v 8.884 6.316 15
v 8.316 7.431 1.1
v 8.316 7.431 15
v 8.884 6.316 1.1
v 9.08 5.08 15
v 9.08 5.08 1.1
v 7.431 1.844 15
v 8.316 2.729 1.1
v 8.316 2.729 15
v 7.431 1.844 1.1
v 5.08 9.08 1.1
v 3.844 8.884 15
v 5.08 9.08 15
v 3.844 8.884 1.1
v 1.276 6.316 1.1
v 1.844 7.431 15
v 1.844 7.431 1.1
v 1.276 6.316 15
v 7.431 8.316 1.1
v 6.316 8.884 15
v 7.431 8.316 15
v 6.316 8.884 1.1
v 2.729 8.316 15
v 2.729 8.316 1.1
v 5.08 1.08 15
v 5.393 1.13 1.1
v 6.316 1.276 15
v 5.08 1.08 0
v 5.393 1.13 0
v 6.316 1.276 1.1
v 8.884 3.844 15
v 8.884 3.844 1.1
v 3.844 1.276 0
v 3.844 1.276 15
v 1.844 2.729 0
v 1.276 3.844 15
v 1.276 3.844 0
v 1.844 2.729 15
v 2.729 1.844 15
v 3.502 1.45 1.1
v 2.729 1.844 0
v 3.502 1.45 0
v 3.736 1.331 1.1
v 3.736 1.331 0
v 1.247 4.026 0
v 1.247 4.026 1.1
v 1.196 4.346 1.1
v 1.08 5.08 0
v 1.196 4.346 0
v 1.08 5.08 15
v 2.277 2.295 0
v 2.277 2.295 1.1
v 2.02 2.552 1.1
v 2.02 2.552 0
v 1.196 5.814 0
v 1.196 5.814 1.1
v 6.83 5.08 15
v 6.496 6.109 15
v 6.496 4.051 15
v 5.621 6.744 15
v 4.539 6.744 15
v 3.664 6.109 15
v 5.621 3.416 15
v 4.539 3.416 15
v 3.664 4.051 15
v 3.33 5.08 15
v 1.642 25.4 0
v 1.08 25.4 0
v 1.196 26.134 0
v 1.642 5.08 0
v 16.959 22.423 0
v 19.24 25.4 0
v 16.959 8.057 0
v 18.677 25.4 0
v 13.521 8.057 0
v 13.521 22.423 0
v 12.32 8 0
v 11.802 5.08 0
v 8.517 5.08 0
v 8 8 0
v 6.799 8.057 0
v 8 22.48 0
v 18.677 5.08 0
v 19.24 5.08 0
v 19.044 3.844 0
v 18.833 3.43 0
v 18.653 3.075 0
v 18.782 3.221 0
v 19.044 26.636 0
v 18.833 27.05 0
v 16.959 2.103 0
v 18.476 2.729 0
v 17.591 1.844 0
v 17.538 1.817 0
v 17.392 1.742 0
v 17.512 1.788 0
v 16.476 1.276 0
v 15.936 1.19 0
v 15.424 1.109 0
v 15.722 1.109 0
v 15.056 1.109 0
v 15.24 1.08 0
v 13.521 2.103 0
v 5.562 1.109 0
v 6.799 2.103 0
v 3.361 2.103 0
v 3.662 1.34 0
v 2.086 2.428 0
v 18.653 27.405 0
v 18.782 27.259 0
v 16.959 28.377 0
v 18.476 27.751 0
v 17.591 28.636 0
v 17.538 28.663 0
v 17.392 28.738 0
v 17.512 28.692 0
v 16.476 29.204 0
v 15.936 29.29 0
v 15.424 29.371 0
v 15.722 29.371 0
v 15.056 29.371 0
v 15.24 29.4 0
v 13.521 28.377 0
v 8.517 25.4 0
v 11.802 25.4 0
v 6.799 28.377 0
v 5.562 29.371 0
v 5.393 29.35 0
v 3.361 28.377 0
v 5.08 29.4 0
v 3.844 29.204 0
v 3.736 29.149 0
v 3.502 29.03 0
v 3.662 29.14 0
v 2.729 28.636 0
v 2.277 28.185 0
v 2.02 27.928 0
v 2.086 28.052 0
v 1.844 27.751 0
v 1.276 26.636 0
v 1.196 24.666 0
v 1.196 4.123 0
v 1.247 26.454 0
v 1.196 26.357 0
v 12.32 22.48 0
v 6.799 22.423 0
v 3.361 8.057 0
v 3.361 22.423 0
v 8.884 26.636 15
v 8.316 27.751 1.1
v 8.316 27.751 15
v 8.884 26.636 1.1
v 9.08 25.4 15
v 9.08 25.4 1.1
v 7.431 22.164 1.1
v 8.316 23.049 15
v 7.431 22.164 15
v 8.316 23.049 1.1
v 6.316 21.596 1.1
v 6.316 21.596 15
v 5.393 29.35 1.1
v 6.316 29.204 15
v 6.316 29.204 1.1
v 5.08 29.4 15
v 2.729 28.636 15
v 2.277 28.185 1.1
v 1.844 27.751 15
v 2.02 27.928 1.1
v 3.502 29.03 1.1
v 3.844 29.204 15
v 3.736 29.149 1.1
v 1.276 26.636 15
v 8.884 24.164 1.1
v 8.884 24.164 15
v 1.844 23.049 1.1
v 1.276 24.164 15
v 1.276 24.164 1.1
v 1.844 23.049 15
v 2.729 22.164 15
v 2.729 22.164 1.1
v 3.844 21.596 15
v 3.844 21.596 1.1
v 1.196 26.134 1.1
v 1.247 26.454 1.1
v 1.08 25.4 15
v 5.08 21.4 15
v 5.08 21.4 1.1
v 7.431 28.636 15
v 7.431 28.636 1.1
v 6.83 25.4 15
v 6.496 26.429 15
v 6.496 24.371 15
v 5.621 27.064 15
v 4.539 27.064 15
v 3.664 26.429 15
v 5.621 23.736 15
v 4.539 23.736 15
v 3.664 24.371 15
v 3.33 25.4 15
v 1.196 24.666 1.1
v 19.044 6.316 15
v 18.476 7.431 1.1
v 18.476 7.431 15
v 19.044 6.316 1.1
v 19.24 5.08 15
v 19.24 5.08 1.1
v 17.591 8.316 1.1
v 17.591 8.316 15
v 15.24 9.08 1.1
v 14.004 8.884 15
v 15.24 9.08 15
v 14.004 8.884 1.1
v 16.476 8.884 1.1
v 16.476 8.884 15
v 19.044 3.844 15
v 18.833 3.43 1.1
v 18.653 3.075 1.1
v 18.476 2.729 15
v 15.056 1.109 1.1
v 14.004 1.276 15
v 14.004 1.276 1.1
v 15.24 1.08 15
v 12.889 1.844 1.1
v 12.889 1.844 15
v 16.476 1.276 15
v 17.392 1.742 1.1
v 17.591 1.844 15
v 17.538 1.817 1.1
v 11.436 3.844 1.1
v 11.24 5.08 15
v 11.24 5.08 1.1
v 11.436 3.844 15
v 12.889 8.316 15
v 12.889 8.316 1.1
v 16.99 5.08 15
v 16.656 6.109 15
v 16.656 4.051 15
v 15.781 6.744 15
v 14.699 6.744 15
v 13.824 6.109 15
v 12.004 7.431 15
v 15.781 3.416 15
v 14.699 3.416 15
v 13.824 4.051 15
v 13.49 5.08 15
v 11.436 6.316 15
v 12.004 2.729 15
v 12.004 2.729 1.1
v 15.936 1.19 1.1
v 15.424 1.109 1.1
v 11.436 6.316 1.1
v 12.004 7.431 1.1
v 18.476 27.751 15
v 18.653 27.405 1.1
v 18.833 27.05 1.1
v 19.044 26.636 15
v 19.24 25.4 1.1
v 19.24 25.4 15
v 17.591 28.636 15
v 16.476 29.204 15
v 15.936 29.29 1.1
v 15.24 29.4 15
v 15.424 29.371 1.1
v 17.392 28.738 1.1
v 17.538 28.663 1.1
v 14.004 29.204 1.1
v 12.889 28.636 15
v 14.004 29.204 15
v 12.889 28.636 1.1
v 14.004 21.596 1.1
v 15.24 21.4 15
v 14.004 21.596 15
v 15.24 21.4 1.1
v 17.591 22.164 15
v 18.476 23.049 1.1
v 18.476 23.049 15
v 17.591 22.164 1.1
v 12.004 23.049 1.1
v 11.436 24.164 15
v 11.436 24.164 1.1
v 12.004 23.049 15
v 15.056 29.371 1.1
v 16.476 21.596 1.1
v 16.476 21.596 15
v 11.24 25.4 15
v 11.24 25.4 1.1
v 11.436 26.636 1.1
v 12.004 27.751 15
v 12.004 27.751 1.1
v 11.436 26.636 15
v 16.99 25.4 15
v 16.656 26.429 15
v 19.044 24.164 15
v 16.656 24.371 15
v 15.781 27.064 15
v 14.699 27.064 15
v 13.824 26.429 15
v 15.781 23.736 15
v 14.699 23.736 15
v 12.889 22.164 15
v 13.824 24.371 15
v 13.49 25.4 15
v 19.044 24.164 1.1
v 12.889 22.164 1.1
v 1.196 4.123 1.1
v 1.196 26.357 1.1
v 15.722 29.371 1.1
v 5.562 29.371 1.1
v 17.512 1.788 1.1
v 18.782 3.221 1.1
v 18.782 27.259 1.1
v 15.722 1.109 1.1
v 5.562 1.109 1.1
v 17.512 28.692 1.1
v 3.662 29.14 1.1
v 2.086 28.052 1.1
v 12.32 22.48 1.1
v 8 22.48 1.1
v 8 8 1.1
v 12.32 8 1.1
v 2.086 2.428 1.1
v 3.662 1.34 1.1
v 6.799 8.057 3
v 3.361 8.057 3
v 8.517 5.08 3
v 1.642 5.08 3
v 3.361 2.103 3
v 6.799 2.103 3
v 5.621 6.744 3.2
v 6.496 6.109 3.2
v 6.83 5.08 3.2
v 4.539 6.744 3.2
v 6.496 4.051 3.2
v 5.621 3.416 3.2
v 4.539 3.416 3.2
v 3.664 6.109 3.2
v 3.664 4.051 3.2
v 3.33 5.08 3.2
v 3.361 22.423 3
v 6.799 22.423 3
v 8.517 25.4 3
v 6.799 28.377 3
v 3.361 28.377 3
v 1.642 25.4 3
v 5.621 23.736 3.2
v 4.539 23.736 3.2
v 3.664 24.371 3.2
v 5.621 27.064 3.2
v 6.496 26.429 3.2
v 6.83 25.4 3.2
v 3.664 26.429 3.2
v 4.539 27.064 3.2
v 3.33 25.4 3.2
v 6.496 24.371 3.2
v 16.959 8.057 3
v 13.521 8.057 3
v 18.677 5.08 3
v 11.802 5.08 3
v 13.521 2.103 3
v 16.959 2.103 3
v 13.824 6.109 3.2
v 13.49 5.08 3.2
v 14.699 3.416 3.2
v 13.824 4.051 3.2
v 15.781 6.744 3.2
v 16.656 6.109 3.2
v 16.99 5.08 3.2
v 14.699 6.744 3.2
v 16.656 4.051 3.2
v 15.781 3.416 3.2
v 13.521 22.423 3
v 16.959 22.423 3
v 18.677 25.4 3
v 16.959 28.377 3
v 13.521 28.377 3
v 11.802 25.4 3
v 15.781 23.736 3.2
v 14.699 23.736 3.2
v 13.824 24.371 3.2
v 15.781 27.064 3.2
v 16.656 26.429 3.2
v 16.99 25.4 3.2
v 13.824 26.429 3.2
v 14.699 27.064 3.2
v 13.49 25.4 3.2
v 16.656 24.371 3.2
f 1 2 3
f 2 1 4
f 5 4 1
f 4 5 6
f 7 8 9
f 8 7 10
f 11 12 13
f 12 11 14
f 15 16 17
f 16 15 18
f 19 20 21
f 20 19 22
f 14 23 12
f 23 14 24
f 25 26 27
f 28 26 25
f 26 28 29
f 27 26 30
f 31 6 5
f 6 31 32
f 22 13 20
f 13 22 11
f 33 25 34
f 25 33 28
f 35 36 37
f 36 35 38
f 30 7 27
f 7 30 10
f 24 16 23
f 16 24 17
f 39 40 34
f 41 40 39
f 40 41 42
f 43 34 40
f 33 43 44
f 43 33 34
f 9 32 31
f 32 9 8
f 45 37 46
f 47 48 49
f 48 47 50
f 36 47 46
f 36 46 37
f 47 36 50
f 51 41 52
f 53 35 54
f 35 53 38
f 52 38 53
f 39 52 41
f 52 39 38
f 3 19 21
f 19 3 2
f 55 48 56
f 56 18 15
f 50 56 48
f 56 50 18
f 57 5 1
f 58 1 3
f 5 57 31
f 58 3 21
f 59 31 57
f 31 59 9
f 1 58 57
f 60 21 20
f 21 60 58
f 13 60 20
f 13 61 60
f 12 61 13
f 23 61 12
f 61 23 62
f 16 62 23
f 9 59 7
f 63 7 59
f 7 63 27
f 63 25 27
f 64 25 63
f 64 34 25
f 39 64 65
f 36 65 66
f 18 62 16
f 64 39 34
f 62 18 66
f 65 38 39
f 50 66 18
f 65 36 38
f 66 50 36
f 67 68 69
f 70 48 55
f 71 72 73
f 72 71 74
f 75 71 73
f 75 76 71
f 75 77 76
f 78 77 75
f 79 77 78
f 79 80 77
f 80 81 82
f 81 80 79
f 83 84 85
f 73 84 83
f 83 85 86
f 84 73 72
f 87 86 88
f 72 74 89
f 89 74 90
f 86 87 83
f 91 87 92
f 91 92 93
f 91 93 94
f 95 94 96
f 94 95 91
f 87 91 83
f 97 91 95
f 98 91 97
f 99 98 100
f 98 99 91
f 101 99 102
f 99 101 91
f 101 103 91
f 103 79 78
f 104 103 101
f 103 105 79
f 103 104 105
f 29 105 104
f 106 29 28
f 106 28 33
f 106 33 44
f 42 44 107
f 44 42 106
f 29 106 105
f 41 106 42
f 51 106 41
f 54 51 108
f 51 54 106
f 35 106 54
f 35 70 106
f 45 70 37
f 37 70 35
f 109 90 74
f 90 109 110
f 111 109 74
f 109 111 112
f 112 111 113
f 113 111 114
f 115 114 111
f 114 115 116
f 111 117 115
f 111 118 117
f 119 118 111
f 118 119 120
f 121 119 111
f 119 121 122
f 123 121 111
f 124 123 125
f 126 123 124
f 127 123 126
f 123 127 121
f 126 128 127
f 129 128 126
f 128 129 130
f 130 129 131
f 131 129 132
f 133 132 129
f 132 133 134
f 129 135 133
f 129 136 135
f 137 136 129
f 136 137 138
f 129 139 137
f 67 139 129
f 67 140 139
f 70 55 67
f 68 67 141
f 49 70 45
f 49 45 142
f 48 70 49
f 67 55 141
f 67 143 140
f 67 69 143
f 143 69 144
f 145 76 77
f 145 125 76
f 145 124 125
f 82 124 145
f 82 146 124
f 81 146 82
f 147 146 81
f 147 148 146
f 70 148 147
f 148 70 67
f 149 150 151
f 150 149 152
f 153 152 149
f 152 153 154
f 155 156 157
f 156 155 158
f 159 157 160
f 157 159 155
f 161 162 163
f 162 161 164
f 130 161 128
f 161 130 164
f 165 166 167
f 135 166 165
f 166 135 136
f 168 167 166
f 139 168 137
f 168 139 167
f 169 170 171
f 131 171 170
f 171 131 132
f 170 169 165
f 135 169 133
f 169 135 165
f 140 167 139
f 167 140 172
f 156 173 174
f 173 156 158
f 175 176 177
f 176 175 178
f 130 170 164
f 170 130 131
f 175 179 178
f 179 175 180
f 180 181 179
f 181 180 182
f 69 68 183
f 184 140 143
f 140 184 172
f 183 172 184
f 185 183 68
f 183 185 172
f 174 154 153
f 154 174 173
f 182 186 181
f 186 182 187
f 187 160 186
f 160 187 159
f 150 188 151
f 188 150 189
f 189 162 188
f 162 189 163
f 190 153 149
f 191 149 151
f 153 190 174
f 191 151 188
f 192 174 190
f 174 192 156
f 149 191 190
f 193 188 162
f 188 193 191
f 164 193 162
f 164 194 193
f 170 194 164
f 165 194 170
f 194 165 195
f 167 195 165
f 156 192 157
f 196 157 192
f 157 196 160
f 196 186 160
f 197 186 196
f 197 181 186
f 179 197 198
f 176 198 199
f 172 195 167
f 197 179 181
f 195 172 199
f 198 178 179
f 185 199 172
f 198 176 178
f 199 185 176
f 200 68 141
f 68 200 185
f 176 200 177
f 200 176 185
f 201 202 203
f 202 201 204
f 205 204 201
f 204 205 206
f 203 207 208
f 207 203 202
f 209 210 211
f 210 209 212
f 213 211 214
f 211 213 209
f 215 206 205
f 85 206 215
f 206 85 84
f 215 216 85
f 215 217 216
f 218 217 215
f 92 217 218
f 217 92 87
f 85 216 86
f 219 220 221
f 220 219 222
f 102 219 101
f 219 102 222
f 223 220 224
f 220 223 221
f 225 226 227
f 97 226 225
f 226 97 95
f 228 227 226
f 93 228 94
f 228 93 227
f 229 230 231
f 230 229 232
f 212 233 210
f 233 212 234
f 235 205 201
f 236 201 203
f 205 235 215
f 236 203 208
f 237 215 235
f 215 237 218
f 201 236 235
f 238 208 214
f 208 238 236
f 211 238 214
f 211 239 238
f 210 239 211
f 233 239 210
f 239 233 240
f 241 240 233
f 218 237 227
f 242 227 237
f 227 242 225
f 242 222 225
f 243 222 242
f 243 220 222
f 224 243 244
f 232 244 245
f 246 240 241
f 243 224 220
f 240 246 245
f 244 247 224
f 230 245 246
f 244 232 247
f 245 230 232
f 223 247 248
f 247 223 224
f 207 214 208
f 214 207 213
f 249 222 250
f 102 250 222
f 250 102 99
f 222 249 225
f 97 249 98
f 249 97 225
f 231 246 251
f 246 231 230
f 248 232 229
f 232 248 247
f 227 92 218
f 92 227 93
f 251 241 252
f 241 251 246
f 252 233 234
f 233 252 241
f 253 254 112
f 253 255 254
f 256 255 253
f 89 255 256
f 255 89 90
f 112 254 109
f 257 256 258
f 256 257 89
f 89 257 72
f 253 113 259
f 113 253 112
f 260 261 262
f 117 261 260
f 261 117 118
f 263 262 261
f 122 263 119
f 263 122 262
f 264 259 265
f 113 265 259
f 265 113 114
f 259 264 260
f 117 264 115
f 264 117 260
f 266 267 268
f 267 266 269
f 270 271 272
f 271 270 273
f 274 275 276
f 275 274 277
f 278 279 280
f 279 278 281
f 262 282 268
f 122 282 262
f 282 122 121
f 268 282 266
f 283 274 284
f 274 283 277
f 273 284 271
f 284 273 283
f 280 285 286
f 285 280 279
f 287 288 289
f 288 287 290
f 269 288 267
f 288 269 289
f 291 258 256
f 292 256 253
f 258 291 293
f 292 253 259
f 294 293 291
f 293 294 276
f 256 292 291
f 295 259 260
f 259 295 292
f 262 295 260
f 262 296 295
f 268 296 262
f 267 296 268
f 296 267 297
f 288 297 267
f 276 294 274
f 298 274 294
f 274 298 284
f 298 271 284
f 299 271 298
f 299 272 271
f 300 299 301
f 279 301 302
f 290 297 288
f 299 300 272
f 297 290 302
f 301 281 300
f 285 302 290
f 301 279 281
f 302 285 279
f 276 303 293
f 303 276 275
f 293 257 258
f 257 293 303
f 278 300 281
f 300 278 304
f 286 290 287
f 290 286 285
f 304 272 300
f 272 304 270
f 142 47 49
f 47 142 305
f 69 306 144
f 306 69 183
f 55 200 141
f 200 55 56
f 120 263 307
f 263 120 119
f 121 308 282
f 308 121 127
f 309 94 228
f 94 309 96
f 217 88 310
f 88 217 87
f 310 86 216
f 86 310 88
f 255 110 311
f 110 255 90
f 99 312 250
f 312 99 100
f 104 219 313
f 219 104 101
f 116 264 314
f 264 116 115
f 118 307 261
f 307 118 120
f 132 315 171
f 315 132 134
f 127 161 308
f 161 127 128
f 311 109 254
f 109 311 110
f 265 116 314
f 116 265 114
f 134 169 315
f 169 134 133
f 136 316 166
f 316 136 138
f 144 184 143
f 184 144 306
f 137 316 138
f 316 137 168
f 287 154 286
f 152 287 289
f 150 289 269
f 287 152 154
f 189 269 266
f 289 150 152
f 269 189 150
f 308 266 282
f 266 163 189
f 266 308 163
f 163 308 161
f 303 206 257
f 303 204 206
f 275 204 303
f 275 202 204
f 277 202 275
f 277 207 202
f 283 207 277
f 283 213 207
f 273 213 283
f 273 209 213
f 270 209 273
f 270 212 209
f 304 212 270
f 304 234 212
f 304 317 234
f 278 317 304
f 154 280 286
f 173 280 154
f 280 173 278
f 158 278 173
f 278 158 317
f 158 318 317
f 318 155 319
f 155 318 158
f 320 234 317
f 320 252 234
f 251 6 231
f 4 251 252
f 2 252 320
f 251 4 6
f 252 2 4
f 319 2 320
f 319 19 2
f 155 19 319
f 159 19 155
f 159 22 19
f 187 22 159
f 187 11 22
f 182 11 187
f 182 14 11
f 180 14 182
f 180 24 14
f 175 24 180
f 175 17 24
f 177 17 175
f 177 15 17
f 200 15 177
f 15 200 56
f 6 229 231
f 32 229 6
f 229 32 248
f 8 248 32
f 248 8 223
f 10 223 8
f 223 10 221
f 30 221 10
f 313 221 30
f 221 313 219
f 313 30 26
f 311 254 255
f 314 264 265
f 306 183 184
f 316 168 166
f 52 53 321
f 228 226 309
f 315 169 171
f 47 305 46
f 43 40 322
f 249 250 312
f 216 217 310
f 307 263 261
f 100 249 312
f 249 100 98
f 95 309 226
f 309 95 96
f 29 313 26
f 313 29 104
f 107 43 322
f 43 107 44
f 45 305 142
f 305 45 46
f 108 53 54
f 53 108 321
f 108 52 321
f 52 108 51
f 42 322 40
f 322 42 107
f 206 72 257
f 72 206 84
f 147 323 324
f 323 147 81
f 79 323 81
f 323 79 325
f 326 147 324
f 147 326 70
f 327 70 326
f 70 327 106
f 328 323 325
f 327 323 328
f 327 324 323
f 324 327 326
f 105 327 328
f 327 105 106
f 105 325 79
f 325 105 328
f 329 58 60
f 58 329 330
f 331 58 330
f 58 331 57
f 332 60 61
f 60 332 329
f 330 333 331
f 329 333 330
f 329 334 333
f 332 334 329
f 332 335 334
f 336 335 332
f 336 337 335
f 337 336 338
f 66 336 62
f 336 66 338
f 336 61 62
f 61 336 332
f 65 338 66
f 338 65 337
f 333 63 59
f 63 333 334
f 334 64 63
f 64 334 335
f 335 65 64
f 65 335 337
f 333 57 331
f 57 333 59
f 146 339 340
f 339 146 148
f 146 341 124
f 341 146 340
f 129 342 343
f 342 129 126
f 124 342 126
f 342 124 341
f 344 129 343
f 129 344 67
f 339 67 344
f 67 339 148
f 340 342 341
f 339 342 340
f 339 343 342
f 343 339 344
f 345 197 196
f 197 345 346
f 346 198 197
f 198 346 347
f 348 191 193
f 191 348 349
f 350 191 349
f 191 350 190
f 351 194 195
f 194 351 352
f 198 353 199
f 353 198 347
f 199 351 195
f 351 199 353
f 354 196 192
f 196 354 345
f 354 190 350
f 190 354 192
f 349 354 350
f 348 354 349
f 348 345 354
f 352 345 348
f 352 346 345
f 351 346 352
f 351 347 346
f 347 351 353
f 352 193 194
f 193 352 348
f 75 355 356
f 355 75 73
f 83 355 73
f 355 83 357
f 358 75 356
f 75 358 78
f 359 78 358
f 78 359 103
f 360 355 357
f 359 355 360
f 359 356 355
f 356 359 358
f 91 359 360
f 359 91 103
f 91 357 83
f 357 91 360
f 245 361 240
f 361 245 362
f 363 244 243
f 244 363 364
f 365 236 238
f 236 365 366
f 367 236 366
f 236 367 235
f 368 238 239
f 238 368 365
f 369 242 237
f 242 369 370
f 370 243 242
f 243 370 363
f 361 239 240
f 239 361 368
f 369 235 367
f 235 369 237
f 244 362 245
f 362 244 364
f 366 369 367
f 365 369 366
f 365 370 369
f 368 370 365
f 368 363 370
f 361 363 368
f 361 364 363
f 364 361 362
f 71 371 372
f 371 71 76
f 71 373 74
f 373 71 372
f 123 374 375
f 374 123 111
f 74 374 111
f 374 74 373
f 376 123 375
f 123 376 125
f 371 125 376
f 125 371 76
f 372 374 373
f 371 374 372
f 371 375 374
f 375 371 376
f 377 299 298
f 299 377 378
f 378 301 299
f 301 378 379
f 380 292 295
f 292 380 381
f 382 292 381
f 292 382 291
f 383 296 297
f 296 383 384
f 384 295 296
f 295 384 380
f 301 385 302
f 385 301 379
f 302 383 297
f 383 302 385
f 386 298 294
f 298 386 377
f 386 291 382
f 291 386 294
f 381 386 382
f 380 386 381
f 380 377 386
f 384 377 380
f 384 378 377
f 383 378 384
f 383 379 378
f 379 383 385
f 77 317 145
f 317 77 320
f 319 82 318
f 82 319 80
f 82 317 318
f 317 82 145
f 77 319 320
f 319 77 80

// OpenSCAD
x_holes = 2;
y_holes = 3;
MLAB_grid = 10.16;
pile_radius = 4;
pedestal_height = 15;   // designed for use the MLAB standard 20mm screws.
x_size = x_holes * MLAB_grid ;
y_size = y_holes * MLAB_grid ;
mount_hole = 3.5;
//nut_size = 6.8;  //size suitable for PLA material
nut_size = 6.7;  //size suitable for ABS material
clear = 0.175;


thickness = 1;

MLAB_grid_xoffset = MLAB_grid/2;
MLAB_grid_yoffset = MLAB_grid/2;

grid_list = [for (j = [MLAB_grid_xoffset : MLAB_grid: x_size], i = [MLAB_grid_yoffset :MLAB_grid: y_size]) 
if ((j>(x_size-10) && i>(y_size-10)) || (j<10 && i<10) || (j<10 && i>(y_size-10)) || (j>(x_size-10) && i<10) ) [j, i] ];


difference () {
    union () {
        for (j = grid_list) {
            translate (concat(j, [0]))
            cylinder (h = pedestal_height, r= pile_radius, $fn=20);
        }

            translate ([MLAB_grid_xoffset , MLAB_grid_yoffset , 0])
                minkowski() {
                cube([x_size - 2*(MLAB_grid/2 - pile_radius) - 2*pile_radius, y_size - 2*(MLAB_grid/2 - pile_radius) - 2*pile_radius, thickness]);          // base plastics brick
                cylinder(r=pile_radius,h=0.1);
            }
    }
    
    translate ([2*pile_radius, 2*pile_radius, 0]) // central hole in module support
        cube([x_size-4*pile_radius, y_size-4*pile_radius, 2*thickness]);          

    // MLAB grid holes
    for (j = grid_list) {
            translate (concat(j, [0]))
            cylinder (h = 3, r= (nut_size+clear)/2, $fn=6);
            translate (concat(j, [3.2]))  // one solid layer for slicer (the holes will be pierced on demand )
            cylinder (h = pedestal_height, r= mount_hole/2, $fn=10);
        }    
}
